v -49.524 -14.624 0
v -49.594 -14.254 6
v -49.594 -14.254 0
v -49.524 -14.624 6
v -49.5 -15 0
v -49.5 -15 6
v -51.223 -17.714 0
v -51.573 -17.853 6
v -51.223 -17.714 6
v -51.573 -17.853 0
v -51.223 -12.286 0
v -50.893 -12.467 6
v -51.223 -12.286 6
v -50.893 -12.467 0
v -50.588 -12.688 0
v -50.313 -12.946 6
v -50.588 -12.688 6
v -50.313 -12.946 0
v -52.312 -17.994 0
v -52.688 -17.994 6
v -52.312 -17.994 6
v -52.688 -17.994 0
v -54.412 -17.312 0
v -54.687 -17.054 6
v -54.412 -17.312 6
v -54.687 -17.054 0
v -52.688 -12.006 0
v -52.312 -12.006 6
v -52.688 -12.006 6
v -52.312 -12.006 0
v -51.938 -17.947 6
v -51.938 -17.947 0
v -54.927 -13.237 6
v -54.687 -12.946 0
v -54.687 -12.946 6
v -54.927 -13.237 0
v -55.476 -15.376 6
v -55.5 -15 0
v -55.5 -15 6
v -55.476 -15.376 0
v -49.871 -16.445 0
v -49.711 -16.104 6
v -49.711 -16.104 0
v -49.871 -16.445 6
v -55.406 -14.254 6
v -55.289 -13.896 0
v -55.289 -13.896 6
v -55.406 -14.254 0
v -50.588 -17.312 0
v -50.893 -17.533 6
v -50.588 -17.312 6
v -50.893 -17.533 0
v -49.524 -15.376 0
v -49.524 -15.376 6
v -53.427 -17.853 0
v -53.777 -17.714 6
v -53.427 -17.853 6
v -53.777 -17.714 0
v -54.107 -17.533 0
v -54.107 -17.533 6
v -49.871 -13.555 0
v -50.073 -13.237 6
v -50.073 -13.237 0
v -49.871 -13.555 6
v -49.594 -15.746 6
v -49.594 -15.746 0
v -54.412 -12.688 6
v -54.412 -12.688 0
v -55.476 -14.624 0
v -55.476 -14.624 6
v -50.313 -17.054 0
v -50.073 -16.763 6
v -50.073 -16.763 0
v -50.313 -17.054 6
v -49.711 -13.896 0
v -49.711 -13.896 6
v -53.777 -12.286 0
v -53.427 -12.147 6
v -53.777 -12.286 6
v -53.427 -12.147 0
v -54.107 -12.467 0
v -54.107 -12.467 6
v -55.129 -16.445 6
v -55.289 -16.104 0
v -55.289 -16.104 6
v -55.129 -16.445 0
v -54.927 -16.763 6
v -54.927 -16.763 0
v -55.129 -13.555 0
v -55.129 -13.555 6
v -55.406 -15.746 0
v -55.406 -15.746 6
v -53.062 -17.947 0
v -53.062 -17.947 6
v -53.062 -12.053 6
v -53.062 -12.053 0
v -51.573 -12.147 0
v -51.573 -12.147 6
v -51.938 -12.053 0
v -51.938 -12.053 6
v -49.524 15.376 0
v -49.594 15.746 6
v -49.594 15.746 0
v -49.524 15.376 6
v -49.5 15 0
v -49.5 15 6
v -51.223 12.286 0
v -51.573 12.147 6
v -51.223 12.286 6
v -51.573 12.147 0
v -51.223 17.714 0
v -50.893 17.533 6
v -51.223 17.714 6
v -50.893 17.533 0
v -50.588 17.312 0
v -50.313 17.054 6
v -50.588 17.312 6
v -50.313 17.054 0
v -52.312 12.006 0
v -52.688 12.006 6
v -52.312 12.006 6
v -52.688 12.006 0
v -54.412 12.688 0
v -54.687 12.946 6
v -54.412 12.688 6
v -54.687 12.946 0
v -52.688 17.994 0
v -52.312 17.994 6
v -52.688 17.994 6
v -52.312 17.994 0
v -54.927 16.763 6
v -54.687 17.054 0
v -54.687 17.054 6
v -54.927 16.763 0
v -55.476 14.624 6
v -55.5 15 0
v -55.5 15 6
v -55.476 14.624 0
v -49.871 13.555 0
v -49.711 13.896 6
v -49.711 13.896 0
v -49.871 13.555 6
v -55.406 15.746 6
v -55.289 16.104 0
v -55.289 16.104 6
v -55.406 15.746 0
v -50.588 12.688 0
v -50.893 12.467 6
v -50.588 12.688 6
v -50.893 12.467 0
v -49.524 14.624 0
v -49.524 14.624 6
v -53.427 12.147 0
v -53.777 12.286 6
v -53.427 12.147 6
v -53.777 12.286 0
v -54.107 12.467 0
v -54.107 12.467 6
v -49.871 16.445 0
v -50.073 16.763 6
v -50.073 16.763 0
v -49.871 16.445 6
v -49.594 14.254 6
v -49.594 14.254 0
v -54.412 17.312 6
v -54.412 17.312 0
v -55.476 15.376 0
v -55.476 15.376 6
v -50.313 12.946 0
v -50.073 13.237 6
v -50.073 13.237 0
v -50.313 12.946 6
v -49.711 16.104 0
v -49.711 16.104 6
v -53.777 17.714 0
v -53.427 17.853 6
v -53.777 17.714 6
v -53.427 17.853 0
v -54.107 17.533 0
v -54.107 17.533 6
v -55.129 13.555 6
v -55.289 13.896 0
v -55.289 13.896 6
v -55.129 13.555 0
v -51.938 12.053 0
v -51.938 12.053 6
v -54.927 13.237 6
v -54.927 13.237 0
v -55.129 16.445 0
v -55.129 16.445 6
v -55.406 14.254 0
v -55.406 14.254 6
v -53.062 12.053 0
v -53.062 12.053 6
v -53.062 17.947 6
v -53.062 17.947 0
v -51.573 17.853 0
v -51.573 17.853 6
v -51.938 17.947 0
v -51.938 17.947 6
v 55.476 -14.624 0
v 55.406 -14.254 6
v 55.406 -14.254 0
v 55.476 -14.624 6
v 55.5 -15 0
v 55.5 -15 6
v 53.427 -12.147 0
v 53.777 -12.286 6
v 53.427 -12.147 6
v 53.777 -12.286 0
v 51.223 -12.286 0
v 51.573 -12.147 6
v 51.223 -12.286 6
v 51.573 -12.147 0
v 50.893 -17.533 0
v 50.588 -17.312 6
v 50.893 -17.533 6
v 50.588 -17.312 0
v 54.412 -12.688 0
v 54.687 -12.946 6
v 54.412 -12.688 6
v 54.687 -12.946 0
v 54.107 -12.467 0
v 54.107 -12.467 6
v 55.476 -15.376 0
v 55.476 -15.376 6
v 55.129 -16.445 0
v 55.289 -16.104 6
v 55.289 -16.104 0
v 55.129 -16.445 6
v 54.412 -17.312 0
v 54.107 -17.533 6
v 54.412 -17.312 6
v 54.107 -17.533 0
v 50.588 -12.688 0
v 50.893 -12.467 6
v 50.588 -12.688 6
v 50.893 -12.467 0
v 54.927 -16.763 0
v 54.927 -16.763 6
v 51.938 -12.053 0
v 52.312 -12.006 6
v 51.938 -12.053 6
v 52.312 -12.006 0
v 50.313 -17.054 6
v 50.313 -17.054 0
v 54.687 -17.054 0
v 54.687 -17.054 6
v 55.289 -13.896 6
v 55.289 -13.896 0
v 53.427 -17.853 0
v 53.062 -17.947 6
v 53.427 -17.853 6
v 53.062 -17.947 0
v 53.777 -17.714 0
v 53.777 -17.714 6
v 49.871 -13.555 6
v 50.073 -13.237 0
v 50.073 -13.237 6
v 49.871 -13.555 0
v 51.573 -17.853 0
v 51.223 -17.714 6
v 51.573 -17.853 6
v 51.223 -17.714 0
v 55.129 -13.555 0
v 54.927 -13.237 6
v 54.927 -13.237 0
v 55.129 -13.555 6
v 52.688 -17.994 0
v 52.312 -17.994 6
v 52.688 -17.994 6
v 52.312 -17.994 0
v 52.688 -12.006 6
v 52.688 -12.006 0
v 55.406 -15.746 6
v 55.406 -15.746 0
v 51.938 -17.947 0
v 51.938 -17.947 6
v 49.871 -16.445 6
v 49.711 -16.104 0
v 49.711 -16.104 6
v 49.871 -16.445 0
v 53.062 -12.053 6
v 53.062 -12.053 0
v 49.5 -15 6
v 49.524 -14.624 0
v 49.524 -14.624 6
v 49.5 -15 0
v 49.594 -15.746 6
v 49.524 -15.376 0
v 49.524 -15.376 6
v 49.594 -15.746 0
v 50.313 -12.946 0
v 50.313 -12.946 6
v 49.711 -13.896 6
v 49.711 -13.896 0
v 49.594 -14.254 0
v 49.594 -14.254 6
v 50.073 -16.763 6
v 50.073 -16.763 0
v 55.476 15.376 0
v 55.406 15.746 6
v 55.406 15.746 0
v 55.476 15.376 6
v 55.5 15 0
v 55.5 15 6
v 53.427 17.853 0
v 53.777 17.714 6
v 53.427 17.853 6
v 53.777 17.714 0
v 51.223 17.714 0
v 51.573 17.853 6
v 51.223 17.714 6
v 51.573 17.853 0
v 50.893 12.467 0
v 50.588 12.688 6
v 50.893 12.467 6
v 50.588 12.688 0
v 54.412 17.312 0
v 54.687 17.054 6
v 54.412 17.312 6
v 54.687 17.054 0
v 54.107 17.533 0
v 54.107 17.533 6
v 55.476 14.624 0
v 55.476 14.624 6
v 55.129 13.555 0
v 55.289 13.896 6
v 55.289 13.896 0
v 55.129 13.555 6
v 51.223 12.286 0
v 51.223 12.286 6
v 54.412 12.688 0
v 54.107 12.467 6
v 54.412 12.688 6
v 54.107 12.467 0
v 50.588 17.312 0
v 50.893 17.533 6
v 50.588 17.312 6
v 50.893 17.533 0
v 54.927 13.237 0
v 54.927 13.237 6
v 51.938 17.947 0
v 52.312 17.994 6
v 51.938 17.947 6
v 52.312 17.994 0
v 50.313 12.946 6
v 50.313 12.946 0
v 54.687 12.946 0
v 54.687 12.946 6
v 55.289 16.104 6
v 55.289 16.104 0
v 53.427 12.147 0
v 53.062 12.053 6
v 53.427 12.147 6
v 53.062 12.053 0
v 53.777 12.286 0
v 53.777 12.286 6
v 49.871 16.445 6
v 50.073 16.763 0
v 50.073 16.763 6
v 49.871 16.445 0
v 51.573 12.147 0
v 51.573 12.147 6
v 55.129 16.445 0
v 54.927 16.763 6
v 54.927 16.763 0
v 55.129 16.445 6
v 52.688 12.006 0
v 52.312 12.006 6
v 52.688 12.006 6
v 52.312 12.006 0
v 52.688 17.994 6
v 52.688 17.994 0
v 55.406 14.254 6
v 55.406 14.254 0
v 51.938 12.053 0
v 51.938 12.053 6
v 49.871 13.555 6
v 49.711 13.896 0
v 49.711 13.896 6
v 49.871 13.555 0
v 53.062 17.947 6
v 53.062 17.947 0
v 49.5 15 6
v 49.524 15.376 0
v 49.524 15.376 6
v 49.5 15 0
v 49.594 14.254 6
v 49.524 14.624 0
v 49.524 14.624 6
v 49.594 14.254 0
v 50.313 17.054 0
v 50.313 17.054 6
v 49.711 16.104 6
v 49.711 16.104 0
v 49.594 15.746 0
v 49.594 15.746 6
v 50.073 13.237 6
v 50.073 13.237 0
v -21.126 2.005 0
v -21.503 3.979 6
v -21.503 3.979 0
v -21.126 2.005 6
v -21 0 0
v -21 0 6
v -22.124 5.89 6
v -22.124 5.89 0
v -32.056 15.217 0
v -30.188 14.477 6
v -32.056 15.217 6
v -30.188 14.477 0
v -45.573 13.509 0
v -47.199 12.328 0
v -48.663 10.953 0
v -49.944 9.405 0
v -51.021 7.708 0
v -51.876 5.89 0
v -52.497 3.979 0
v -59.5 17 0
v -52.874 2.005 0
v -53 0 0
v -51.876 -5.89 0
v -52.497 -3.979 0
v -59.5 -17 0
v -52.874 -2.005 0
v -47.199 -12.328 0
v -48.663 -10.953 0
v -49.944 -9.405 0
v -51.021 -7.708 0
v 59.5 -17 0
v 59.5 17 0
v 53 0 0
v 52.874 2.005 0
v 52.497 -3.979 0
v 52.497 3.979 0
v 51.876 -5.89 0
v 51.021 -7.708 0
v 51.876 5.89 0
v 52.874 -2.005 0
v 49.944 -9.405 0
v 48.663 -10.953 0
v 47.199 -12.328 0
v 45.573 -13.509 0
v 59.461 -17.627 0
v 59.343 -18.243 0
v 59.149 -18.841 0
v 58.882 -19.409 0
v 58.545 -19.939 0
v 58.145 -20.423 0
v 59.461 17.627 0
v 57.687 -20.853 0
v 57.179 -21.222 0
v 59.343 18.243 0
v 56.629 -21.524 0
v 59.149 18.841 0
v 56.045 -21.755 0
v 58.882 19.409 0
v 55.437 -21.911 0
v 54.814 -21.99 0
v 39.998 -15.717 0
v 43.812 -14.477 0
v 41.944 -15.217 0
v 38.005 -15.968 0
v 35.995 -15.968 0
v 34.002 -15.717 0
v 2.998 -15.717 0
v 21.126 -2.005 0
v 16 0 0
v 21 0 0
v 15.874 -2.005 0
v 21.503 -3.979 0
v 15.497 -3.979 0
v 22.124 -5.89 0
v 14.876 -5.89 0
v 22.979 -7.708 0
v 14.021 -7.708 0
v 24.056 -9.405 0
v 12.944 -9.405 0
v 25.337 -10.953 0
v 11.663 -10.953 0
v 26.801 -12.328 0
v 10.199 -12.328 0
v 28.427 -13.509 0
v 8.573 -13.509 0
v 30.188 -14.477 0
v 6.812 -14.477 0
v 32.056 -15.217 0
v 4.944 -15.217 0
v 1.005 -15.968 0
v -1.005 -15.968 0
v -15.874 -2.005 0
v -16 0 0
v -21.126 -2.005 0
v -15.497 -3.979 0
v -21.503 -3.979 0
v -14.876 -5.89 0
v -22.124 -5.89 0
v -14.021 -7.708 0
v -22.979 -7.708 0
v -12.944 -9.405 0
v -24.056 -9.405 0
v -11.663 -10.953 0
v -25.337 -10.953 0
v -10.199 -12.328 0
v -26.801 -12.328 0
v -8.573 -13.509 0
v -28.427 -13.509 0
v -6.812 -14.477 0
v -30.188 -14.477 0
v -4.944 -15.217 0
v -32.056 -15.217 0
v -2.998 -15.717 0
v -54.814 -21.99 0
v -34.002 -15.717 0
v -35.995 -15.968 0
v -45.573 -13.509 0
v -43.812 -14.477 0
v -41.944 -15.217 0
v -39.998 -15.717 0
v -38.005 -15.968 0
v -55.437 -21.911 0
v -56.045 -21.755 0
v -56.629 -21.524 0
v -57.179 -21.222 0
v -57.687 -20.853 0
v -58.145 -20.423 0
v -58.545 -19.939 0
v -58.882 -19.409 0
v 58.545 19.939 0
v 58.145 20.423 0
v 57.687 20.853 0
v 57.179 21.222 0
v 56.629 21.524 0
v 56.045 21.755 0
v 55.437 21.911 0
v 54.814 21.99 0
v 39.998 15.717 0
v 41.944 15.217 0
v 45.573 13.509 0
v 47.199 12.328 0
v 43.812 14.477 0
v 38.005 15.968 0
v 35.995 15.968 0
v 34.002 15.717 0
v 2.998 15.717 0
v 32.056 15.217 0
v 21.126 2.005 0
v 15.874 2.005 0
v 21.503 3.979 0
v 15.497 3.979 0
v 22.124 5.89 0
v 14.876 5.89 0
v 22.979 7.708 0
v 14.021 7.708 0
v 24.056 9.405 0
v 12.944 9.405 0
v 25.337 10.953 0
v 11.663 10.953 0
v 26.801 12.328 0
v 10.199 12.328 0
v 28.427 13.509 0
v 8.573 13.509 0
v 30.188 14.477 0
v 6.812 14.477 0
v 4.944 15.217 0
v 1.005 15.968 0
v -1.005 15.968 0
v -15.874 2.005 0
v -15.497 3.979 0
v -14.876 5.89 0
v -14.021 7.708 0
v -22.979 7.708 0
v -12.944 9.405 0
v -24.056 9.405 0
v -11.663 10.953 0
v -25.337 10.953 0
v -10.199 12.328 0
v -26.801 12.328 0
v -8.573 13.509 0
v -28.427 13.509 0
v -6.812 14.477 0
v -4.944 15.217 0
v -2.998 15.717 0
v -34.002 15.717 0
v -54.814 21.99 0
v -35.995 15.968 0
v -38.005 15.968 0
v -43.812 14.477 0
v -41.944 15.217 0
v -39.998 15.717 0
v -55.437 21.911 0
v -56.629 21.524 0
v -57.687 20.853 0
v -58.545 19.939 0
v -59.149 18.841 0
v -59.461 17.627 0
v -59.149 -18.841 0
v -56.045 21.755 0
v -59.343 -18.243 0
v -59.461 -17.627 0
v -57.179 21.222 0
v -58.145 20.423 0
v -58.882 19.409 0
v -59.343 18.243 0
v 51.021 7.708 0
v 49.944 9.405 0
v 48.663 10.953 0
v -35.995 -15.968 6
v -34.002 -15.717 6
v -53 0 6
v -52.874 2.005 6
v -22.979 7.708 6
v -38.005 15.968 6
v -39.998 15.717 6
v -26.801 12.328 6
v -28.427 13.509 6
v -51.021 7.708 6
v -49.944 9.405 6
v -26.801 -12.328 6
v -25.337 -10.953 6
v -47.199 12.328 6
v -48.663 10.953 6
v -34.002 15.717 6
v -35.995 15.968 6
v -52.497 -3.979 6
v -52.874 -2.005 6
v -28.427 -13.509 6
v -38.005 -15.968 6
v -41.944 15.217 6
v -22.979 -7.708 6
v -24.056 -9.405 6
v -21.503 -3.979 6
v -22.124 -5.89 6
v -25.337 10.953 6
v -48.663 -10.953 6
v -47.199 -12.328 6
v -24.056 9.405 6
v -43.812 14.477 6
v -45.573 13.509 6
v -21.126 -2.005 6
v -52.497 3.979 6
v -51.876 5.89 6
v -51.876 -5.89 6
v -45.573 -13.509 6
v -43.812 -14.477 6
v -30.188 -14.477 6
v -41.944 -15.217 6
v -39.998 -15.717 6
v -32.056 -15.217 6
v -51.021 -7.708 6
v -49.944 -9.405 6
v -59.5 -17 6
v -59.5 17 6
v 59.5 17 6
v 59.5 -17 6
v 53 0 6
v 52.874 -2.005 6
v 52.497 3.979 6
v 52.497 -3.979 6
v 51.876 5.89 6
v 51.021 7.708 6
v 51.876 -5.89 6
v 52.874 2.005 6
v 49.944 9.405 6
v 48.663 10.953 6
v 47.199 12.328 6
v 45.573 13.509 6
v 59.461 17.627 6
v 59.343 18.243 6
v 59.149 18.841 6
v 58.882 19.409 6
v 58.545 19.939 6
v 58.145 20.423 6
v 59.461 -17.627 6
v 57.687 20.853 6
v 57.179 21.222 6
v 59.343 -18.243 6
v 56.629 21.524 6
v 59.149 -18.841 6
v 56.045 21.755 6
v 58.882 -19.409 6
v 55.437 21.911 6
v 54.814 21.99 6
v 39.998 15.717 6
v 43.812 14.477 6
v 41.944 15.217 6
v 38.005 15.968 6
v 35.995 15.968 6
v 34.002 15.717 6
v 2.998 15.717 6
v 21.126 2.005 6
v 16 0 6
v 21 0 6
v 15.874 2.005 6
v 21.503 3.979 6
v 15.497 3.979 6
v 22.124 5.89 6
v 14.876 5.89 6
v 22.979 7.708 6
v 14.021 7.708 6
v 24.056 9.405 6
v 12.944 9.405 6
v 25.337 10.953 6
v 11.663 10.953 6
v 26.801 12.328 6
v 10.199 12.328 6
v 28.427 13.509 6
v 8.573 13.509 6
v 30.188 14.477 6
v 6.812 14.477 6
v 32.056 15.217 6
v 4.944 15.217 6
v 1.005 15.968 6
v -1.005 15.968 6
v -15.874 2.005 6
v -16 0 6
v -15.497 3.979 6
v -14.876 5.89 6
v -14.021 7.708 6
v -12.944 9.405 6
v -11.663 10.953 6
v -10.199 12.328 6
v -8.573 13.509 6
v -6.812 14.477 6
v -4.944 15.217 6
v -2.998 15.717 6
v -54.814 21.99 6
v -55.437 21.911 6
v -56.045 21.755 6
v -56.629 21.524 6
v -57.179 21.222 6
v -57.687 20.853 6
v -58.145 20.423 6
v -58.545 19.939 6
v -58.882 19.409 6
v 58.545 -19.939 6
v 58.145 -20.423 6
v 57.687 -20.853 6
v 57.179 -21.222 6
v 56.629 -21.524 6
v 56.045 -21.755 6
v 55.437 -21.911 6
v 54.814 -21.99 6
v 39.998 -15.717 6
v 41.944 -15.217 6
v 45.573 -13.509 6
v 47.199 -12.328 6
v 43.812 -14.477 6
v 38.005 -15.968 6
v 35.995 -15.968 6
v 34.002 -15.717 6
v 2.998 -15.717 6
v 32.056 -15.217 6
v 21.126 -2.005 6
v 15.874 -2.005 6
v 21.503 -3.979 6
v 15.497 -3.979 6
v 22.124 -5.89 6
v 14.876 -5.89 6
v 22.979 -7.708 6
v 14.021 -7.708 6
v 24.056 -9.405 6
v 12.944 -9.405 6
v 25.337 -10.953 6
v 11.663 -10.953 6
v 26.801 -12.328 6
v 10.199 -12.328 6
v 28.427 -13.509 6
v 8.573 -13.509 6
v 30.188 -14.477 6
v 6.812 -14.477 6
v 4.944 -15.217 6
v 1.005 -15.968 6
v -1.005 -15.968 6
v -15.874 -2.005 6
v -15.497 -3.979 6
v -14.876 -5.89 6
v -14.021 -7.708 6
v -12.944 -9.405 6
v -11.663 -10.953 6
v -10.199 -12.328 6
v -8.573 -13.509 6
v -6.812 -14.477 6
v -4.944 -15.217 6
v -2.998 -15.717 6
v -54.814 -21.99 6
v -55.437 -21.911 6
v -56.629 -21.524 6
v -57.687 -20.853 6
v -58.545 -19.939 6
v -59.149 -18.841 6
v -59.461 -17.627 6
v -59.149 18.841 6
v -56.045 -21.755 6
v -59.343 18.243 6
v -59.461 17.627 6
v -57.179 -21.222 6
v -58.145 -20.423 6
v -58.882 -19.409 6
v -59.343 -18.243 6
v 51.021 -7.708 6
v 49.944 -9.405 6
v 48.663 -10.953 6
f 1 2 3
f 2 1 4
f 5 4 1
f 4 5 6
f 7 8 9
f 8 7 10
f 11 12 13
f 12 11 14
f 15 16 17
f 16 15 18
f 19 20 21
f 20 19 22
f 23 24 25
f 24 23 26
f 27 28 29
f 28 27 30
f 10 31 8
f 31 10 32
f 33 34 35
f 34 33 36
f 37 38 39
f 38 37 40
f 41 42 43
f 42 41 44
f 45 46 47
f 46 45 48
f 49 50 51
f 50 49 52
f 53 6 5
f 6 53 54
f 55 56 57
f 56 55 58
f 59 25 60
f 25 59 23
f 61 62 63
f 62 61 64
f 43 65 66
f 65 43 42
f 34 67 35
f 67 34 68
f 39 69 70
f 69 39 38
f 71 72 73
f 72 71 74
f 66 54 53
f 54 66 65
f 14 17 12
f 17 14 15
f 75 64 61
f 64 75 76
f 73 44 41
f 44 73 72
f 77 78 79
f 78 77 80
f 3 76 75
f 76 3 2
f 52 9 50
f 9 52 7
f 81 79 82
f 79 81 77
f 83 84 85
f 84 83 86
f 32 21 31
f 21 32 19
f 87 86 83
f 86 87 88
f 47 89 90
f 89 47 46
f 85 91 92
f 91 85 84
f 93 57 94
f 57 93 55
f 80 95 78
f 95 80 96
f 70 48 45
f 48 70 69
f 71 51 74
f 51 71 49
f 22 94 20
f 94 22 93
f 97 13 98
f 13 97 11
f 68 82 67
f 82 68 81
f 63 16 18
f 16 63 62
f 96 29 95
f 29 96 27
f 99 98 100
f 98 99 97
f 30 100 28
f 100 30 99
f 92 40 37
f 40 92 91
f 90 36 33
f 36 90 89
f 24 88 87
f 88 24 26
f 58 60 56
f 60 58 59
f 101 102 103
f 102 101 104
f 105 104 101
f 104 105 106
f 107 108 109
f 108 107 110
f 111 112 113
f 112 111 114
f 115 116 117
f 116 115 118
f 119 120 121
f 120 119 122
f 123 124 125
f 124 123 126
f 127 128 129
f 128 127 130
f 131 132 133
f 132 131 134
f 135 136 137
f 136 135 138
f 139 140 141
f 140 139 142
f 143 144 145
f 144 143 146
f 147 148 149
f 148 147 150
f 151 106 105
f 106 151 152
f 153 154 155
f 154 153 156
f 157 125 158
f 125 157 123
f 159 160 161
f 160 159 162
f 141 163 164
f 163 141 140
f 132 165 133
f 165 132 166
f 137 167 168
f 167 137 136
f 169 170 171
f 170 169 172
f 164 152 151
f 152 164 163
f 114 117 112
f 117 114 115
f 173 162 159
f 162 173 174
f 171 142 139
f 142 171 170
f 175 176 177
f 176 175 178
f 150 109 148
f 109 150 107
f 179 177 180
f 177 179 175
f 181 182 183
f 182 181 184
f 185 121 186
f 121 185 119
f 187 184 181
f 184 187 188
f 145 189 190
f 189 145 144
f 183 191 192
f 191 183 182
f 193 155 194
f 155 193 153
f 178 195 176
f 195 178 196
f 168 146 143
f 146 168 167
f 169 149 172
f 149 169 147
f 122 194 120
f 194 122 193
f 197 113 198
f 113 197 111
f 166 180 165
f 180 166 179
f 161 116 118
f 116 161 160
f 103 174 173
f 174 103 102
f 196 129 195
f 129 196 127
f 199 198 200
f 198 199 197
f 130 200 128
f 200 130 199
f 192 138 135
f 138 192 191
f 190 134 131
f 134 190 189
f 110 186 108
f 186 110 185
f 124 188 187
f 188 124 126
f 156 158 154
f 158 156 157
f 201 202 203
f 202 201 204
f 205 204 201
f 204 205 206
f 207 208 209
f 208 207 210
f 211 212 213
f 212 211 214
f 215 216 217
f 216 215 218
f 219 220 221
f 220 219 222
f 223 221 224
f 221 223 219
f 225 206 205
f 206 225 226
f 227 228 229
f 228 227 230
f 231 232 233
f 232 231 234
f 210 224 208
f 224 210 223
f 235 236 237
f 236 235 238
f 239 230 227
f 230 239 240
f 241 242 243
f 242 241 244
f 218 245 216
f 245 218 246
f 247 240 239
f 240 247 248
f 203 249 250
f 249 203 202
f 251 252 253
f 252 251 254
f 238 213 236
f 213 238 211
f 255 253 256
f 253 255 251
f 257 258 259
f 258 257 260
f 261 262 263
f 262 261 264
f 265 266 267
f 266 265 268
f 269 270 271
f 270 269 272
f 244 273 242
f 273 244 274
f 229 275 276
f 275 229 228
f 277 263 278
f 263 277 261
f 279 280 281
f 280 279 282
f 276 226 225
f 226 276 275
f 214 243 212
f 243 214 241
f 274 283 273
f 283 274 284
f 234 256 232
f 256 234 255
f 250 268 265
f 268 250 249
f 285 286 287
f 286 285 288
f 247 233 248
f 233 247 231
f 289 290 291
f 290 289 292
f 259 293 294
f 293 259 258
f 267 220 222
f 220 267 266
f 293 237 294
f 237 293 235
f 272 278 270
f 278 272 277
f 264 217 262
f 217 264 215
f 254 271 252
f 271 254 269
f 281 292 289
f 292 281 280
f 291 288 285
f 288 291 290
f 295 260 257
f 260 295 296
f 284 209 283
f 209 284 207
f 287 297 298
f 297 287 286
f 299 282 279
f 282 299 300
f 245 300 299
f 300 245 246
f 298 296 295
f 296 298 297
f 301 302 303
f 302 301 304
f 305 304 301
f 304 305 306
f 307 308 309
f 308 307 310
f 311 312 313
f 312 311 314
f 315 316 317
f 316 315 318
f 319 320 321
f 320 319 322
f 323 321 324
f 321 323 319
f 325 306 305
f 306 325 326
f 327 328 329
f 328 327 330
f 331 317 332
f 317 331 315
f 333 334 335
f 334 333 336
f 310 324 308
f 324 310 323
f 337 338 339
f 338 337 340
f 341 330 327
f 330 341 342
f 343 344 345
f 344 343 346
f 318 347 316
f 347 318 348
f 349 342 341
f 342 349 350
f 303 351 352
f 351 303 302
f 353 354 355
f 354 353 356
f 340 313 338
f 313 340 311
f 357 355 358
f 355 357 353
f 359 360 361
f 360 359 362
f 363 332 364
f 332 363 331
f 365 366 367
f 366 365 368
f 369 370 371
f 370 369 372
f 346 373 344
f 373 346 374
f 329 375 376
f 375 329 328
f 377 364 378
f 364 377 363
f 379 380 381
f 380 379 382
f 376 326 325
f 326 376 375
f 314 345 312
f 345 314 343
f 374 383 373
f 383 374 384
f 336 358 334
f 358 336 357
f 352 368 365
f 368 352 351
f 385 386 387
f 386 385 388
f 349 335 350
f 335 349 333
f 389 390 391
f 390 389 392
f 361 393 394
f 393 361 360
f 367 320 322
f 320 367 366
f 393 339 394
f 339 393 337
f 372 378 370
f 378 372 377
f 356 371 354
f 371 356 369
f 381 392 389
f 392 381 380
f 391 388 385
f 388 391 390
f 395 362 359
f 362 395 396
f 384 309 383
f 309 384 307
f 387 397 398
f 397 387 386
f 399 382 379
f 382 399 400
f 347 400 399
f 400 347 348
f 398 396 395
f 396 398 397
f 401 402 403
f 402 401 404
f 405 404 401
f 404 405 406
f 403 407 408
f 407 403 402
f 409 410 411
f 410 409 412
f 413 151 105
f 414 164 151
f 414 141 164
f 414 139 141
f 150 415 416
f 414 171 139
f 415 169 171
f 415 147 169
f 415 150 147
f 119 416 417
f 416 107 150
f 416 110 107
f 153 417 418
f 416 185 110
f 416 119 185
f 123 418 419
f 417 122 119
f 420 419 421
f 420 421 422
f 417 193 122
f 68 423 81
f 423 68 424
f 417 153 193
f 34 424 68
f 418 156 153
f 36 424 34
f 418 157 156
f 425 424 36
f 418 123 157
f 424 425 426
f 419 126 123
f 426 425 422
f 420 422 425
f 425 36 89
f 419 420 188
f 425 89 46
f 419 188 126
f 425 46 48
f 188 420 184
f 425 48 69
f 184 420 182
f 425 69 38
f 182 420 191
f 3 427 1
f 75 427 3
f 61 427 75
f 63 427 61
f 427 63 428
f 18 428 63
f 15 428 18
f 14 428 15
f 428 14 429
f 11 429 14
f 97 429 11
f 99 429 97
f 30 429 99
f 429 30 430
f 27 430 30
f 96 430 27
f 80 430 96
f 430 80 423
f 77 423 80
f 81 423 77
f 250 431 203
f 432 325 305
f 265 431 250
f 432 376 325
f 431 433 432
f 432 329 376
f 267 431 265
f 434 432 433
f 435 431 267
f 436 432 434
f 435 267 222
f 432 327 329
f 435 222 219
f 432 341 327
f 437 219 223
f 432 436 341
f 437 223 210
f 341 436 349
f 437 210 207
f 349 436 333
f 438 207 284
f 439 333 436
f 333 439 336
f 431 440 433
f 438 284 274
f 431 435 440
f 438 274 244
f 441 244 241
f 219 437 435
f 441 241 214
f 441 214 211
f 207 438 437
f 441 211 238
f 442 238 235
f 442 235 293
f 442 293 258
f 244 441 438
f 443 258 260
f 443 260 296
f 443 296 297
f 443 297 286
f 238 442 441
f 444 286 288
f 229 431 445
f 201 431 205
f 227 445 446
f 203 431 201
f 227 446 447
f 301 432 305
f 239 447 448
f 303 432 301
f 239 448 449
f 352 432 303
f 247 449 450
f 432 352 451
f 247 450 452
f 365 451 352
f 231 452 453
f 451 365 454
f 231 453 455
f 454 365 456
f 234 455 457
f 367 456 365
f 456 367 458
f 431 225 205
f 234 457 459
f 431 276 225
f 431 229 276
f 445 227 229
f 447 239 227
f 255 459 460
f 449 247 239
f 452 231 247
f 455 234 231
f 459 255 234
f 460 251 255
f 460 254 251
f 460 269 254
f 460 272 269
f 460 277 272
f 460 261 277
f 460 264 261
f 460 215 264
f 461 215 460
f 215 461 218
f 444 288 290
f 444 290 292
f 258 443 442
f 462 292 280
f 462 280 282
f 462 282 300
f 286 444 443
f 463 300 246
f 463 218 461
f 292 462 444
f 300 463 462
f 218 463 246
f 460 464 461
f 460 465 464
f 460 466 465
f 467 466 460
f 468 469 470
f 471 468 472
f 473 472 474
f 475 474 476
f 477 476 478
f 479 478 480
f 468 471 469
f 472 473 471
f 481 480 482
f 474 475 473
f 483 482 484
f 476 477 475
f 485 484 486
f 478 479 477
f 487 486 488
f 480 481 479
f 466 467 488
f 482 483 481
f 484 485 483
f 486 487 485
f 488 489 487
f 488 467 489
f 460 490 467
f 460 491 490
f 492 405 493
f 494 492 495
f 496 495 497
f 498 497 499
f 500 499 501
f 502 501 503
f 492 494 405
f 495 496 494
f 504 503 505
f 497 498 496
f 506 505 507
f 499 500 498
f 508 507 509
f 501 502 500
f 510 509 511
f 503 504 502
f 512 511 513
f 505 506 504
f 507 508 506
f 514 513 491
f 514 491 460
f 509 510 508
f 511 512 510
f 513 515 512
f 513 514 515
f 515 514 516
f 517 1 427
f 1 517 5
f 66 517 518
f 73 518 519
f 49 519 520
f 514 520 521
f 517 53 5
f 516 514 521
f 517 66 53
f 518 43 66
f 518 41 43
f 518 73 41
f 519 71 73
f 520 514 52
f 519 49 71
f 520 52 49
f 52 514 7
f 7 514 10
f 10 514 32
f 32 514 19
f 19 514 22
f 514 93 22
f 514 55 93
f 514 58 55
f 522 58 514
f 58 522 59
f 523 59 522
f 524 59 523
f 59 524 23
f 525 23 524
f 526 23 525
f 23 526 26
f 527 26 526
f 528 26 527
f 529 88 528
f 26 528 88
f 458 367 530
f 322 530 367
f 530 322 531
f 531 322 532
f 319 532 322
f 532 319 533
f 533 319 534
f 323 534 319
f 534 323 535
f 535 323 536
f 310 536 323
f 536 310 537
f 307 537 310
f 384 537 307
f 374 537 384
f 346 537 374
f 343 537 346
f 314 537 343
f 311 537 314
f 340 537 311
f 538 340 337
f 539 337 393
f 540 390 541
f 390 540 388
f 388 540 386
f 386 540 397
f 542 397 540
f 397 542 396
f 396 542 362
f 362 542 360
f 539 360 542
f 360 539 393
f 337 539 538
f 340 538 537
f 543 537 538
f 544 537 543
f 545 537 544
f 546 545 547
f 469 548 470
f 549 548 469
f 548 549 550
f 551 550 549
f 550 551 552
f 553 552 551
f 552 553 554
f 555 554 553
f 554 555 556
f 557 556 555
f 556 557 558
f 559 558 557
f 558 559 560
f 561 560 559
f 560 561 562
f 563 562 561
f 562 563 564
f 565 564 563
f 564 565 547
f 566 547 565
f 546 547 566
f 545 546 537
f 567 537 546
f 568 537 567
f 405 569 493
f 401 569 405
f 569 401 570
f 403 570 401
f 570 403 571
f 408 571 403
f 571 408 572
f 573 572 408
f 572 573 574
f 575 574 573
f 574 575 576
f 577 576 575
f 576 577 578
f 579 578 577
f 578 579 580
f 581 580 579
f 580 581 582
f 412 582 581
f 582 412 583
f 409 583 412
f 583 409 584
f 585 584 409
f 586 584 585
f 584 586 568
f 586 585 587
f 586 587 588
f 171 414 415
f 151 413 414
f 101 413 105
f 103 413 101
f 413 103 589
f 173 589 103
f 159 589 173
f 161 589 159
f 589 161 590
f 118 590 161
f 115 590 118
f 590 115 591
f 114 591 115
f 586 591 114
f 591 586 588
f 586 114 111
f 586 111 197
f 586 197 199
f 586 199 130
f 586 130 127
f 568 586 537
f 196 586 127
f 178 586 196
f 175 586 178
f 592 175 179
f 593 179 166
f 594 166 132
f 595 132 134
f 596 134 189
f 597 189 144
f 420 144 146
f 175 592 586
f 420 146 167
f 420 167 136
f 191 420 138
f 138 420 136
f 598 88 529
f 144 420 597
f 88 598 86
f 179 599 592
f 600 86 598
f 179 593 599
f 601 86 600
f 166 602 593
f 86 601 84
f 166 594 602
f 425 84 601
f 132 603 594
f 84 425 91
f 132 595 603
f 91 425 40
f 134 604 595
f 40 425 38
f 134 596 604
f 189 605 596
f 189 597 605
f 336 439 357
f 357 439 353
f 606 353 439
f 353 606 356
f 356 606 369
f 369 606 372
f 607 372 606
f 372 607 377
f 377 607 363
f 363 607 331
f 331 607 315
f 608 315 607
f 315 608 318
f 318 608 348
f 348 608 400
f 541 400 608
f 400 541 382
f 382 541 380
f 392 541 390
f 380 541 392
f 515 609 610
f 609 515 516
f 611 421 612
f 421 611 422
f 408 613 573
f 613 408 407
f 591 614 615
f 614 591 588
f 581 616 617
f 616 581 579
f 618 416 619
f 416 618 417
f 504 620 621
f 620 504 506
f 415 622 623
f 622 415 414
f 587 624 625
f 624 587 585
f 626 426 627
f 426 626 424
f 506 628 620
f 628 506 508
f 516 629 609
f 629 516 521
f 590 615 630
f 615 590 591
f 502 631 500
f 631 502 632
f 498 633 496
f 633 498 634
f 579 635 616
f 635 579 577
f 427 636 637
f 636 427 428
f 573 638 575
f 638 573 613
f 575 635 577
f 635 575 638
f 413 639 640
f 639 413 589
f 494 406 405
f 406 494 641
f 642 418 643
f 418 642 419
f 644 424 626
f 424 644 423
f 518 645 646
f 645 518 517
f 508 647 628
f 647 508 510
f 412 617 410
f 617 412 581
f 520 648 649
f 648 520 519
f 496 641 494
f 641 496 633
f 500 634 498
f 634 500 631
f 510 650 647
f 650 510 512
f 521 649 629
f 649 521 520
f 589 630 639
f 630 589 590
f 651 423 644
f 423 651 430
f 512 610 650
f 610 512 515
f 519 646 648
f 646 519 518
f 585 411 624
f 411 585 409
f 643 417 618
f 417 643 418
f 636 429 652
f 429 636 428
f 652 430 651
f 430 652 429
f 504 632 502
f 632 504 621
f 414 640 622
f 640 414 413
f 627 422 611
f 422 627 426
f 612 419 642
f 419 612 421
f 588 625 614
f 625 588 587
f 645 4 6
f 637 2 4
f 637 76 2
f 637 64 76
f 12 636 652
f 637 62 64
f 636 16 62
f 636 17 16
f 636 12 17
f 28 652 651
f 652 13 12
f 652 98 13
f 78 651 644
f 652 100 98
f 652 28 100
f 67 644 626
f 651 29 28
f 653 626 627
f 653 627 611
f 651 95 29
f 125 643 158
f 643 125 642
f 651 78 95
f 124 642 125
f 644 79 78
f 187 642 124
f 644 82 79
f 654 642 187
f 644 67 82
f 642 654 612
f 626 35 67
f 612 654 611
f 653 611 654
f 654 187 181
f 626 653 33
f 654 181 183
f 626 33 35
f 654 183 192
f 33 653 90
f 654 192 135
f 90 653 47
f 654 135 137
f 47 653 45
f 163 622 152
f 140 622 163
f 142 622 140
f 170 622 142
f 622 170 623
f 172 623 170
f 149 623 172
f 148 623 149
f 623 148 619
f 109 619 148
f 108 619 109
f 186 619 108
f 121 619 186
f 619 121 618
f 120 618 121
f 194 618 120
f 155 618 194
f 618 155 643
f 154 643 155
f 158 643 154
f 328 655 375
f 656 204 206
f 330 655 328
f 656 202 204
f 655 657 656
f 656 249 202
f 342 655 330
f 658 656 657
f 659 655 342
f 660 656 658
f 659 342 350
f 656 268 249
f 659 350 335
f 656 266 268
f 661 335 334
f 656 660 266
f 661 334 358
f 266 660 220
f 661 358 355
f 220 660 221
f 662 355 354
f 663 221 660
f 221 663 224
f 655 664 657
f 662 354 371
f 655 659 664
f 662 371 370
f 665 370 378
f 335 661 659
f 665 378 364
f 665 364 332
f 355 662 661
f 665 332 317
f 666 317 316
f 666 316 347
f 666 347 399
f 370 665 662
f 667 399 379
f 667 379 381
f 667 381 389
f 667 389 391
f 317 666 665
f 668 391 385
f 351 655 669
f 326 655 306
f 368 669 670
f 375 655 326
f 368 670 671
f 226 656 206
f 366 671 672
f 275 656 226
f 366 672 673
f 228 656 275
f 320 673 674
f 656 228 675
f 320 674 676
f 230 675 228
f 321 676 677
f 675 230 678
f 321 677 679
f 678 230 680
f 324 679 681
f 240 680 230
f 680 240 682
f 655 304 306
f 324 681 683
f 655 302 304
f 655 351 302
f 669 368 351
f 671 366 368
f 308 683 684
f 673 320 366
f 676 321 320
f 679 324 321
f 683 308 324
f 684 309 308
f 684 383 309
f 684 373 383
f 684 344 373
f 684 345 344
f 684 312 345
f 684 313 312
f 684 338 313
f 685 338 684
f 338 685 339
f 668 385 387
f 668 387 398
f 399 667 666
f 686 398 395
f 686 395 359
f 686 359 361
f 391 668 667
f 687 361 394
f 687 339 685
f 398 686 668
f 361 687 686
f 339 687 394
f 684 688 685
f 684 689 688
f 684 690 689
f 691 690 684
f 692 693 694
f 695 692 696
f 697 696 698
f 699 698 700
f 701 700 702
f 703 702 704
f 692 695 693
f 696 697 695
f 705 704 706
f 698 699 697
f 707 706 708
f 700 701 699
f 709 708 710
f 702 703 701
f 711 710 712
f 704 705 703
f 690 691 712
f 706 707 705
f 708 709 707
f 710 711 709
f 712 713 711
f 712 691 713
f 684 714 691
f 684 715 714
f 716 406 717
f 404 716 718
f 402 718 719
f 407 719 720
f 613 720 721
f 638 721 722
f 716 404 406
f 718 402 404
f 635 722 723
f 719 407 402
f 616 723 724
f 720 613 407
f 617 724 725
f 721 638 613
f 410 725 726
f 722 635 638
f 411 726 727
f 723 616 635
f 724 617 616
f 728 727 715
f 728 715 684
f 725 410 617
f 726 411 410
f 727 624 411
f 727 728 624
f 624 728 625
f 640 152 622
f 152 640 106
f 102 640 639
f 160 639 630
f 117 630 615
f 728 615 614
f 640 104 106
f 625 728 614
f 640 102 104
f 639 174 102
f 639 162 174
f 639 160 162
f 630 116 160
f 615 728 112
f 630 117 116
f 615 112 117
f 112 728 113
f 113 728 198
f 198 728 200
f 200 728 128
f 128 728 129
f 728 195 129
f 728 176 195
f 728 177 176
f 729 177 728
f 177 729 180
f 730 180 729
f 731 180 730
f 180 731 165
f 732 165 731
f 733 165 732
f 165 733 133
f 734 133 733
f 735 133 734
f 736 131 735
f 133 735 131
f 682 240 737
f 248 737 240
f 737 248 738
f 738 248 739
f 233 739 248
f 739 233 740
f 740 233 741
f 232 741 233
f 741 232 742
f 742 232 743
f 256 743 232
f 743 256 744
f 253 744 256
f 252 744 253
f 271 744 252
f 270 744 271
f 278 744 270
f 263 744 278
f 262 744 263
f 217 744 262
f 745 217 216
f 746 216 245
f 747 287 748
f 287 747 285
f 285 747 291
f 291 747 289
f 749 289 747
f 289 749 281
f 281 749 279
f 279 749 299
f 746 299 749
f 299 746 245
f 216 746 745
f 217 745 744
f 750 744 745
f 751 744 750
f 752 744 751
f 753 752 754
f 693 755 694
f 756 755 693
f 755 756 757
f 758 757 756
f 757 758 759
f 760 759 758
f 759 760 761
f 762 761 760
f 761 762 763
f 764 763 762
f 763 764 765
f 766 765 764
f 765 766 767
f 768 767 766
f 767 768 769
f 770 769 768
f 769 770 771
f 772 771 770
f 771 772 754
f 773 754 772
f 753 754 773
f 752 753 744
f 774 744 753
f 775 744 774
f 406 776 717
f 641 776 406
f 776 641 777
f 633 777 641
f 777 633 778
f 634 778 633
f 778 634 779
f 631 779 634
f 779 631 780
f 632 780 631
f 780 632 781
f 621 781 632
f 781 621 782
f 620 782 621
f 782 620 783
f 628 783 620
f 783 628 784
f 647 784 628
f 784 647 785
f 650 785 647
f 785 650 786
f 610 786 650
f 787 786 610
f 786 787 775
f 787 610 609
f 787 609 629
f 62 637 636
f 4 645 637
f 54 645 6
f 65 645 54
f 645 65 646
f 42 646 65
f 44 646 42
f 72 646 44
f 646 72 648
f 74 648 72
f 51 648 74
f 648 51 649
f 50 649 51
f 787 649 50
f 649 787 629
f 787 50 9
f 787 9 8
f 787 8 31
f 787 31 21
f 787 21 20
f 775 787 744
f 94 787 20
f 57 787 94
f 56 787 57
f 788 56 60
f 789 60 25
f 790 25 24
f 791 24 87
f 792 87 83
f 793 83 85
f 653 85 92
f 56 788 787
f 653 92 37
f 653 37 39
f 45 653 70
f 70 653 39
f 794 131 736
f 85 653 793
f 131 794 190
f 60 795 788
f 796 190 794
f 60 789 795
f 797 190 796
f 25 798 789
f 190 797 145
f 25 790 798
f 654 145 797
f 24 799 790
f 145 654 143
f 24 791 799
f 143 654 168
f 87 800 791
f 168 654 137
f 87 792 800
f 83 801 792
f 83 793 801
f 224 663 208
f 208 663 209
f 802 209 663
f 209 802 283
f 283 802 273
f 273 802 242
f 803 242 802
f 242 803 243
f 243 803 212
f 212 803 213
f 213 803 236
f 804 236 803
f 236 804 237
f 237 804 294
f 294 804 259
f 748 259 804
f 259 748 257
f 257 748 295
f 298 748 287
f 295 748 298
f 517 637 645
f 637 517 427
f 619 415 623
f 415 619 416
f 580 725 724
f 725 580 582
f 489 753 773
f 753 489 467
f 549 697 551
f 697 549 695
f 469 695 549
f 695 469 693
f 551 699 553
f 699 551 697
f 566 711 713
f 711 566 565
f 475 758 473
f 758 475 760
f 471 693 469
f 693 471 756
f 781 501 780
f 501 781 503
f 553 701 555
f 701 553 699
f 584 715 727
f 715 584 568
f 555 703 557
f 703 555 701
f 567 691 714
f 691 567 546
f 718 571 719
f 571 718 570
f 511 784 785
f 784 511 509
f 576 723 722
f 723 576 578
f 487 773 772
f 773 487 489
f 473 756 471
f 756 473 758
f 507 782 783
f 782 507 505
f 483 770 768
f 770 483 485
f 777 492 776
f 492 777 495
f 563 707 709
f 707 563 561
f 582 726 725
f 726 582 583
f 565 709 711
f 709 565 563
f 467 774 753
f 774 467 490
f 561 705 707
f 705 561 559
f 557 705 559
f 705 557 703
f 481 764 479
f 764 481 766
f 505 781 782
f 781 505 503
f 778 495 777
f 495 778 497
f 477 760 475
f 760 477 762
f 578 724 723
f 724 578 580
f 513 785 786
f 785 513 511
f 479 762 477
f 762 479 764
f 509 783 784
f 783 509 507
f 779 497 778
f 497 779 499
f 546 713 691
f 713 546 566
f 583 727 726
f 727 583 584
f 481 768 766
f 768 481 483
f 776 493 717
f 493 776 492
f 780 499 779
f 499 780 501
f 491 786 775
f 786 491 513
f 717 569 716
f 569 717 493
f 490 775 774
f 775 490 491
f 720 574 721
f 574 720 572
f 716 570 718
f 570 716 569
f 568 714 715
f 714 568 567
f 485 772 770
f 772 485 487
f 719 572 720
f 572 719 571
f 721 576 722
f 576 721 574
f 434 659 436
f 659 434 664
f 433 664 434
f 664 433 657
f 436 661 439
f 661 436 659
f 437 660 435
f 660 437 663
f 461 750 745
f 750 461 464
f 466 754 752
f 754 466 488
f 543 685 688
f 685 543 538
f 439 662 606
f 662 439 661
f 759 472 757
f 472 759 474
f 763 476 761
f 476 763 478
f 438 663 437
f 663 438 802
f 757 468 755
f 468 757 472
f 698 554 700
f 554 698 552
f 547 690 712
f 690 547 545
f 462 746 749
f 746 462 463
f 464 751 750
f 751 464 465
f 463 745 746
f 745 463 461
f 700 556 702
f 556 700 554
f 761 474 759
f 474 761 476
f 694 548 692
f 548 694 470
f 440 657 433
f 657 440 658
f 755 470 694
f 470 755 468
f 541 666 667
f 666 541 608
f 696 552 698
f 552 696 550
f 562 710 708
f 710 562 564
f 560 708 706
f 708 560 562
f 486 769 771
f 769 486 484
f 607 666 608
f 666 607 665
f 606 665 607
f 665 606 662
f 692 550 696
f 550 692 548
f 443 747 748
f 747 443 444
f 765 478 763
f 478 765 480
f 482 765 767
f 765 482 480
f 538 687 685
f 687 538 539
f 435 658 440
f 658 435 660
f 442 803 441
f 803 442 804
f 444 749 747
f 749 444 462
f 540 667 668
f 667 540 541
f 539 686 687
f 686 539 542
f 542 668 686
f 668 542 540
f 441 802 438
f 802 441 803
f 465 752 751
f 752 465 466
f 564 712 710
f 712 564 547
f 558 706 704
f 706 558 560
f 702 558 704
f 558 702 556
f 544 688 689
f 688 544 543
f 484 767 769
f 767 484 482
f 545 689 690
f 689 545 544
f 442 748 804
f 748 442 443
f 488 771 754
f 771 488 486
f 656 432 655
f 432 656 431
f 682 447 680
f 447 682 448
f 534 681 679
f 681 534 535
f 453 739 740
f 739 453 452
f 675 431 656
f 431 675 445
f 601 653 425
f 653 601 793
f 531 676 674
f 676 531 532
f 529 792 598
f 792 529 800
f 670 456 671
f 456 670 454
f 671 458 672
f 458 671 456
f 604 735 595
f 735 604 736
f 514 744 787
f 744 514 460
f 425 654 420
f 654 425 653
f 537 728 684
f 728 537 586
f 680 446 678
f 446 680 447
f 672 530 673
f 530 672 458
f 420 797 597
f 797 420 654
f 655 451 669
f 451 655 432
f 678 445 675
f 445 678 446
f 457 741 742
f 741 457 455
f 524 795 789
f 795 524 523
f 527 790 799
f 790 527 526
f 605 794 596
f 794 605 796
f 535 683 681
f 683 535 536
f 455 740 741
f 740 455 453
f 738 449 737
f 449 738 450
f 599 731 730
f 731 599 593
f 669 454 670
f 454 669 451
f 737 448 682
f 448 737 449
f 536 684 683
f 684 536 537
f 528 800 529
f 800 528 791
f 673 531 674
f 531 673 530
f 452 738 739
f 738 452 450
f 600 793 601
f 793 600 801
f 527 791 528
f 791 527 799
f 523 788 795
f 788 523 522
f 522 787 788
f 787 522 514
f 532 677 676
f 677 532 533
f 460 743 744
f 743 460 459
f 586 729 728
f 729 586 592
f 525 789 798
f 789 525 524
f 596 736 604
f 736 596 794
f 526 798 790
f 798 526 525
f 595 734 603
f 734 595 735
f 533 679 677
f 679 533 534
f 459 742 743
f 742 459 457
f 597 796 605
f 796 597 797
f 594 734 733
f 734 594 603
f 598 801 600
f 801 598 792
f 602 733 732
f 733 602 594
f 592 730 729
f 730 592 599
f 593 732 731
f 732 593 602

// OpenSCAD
$fn = 50;


difference() {
	union() {
		hull() {
			translate(v = [-54.5000000000, 17.0000000000, 0]) {
				cylinder(h = 6, r = 5);
			}
			translate(v = [54.5000000000, 17.0000000000, 0]) {
				cylinder(h = 6, r = 5);
			}
			translate(v = [-54.5000000000, -17.0000000000, 0]) {
				cylinder(h = 6, r = 5);
			}
			translate(v = [54.5000000000, -17.0000000000, 0]) {
				cylinder(h = 6, r = 5);
			}
		}
	}
	union() {
		#translate(v = [-52.5000000000, -15.0000000000, -100.0000000000]) {
			cylinder(h = 200, r = 3.0000000000);
		}
		#translate(v = [-52.5000000000, 15.0000000000, -100.0000000000]) {
			cylinder(h = 200, r = 3.0000000000);
		}
		#translate(v = [52.5000000000, -15.0000000000, -100.0000000000]) {
			cylinder(h = 200, r = 3.0000000000);
		}
		#translate(v = [52.5000000000, 15.0000000000, -100.0000000000]) {
			cylinder(h = 200, r = 3.0000000000);
		}
		#translate(v = [-37.0000000000, 0, 0]) {
			cylinder(h = 6, r = 16.0000000000);
		}
		#cylinder(h = 6, r = 16.0000000000);
		#translate(v = [37.0000000000, 0, 0]) {
			cylinder(h = 6, r = 16.0000000000);
		}
	}
}
